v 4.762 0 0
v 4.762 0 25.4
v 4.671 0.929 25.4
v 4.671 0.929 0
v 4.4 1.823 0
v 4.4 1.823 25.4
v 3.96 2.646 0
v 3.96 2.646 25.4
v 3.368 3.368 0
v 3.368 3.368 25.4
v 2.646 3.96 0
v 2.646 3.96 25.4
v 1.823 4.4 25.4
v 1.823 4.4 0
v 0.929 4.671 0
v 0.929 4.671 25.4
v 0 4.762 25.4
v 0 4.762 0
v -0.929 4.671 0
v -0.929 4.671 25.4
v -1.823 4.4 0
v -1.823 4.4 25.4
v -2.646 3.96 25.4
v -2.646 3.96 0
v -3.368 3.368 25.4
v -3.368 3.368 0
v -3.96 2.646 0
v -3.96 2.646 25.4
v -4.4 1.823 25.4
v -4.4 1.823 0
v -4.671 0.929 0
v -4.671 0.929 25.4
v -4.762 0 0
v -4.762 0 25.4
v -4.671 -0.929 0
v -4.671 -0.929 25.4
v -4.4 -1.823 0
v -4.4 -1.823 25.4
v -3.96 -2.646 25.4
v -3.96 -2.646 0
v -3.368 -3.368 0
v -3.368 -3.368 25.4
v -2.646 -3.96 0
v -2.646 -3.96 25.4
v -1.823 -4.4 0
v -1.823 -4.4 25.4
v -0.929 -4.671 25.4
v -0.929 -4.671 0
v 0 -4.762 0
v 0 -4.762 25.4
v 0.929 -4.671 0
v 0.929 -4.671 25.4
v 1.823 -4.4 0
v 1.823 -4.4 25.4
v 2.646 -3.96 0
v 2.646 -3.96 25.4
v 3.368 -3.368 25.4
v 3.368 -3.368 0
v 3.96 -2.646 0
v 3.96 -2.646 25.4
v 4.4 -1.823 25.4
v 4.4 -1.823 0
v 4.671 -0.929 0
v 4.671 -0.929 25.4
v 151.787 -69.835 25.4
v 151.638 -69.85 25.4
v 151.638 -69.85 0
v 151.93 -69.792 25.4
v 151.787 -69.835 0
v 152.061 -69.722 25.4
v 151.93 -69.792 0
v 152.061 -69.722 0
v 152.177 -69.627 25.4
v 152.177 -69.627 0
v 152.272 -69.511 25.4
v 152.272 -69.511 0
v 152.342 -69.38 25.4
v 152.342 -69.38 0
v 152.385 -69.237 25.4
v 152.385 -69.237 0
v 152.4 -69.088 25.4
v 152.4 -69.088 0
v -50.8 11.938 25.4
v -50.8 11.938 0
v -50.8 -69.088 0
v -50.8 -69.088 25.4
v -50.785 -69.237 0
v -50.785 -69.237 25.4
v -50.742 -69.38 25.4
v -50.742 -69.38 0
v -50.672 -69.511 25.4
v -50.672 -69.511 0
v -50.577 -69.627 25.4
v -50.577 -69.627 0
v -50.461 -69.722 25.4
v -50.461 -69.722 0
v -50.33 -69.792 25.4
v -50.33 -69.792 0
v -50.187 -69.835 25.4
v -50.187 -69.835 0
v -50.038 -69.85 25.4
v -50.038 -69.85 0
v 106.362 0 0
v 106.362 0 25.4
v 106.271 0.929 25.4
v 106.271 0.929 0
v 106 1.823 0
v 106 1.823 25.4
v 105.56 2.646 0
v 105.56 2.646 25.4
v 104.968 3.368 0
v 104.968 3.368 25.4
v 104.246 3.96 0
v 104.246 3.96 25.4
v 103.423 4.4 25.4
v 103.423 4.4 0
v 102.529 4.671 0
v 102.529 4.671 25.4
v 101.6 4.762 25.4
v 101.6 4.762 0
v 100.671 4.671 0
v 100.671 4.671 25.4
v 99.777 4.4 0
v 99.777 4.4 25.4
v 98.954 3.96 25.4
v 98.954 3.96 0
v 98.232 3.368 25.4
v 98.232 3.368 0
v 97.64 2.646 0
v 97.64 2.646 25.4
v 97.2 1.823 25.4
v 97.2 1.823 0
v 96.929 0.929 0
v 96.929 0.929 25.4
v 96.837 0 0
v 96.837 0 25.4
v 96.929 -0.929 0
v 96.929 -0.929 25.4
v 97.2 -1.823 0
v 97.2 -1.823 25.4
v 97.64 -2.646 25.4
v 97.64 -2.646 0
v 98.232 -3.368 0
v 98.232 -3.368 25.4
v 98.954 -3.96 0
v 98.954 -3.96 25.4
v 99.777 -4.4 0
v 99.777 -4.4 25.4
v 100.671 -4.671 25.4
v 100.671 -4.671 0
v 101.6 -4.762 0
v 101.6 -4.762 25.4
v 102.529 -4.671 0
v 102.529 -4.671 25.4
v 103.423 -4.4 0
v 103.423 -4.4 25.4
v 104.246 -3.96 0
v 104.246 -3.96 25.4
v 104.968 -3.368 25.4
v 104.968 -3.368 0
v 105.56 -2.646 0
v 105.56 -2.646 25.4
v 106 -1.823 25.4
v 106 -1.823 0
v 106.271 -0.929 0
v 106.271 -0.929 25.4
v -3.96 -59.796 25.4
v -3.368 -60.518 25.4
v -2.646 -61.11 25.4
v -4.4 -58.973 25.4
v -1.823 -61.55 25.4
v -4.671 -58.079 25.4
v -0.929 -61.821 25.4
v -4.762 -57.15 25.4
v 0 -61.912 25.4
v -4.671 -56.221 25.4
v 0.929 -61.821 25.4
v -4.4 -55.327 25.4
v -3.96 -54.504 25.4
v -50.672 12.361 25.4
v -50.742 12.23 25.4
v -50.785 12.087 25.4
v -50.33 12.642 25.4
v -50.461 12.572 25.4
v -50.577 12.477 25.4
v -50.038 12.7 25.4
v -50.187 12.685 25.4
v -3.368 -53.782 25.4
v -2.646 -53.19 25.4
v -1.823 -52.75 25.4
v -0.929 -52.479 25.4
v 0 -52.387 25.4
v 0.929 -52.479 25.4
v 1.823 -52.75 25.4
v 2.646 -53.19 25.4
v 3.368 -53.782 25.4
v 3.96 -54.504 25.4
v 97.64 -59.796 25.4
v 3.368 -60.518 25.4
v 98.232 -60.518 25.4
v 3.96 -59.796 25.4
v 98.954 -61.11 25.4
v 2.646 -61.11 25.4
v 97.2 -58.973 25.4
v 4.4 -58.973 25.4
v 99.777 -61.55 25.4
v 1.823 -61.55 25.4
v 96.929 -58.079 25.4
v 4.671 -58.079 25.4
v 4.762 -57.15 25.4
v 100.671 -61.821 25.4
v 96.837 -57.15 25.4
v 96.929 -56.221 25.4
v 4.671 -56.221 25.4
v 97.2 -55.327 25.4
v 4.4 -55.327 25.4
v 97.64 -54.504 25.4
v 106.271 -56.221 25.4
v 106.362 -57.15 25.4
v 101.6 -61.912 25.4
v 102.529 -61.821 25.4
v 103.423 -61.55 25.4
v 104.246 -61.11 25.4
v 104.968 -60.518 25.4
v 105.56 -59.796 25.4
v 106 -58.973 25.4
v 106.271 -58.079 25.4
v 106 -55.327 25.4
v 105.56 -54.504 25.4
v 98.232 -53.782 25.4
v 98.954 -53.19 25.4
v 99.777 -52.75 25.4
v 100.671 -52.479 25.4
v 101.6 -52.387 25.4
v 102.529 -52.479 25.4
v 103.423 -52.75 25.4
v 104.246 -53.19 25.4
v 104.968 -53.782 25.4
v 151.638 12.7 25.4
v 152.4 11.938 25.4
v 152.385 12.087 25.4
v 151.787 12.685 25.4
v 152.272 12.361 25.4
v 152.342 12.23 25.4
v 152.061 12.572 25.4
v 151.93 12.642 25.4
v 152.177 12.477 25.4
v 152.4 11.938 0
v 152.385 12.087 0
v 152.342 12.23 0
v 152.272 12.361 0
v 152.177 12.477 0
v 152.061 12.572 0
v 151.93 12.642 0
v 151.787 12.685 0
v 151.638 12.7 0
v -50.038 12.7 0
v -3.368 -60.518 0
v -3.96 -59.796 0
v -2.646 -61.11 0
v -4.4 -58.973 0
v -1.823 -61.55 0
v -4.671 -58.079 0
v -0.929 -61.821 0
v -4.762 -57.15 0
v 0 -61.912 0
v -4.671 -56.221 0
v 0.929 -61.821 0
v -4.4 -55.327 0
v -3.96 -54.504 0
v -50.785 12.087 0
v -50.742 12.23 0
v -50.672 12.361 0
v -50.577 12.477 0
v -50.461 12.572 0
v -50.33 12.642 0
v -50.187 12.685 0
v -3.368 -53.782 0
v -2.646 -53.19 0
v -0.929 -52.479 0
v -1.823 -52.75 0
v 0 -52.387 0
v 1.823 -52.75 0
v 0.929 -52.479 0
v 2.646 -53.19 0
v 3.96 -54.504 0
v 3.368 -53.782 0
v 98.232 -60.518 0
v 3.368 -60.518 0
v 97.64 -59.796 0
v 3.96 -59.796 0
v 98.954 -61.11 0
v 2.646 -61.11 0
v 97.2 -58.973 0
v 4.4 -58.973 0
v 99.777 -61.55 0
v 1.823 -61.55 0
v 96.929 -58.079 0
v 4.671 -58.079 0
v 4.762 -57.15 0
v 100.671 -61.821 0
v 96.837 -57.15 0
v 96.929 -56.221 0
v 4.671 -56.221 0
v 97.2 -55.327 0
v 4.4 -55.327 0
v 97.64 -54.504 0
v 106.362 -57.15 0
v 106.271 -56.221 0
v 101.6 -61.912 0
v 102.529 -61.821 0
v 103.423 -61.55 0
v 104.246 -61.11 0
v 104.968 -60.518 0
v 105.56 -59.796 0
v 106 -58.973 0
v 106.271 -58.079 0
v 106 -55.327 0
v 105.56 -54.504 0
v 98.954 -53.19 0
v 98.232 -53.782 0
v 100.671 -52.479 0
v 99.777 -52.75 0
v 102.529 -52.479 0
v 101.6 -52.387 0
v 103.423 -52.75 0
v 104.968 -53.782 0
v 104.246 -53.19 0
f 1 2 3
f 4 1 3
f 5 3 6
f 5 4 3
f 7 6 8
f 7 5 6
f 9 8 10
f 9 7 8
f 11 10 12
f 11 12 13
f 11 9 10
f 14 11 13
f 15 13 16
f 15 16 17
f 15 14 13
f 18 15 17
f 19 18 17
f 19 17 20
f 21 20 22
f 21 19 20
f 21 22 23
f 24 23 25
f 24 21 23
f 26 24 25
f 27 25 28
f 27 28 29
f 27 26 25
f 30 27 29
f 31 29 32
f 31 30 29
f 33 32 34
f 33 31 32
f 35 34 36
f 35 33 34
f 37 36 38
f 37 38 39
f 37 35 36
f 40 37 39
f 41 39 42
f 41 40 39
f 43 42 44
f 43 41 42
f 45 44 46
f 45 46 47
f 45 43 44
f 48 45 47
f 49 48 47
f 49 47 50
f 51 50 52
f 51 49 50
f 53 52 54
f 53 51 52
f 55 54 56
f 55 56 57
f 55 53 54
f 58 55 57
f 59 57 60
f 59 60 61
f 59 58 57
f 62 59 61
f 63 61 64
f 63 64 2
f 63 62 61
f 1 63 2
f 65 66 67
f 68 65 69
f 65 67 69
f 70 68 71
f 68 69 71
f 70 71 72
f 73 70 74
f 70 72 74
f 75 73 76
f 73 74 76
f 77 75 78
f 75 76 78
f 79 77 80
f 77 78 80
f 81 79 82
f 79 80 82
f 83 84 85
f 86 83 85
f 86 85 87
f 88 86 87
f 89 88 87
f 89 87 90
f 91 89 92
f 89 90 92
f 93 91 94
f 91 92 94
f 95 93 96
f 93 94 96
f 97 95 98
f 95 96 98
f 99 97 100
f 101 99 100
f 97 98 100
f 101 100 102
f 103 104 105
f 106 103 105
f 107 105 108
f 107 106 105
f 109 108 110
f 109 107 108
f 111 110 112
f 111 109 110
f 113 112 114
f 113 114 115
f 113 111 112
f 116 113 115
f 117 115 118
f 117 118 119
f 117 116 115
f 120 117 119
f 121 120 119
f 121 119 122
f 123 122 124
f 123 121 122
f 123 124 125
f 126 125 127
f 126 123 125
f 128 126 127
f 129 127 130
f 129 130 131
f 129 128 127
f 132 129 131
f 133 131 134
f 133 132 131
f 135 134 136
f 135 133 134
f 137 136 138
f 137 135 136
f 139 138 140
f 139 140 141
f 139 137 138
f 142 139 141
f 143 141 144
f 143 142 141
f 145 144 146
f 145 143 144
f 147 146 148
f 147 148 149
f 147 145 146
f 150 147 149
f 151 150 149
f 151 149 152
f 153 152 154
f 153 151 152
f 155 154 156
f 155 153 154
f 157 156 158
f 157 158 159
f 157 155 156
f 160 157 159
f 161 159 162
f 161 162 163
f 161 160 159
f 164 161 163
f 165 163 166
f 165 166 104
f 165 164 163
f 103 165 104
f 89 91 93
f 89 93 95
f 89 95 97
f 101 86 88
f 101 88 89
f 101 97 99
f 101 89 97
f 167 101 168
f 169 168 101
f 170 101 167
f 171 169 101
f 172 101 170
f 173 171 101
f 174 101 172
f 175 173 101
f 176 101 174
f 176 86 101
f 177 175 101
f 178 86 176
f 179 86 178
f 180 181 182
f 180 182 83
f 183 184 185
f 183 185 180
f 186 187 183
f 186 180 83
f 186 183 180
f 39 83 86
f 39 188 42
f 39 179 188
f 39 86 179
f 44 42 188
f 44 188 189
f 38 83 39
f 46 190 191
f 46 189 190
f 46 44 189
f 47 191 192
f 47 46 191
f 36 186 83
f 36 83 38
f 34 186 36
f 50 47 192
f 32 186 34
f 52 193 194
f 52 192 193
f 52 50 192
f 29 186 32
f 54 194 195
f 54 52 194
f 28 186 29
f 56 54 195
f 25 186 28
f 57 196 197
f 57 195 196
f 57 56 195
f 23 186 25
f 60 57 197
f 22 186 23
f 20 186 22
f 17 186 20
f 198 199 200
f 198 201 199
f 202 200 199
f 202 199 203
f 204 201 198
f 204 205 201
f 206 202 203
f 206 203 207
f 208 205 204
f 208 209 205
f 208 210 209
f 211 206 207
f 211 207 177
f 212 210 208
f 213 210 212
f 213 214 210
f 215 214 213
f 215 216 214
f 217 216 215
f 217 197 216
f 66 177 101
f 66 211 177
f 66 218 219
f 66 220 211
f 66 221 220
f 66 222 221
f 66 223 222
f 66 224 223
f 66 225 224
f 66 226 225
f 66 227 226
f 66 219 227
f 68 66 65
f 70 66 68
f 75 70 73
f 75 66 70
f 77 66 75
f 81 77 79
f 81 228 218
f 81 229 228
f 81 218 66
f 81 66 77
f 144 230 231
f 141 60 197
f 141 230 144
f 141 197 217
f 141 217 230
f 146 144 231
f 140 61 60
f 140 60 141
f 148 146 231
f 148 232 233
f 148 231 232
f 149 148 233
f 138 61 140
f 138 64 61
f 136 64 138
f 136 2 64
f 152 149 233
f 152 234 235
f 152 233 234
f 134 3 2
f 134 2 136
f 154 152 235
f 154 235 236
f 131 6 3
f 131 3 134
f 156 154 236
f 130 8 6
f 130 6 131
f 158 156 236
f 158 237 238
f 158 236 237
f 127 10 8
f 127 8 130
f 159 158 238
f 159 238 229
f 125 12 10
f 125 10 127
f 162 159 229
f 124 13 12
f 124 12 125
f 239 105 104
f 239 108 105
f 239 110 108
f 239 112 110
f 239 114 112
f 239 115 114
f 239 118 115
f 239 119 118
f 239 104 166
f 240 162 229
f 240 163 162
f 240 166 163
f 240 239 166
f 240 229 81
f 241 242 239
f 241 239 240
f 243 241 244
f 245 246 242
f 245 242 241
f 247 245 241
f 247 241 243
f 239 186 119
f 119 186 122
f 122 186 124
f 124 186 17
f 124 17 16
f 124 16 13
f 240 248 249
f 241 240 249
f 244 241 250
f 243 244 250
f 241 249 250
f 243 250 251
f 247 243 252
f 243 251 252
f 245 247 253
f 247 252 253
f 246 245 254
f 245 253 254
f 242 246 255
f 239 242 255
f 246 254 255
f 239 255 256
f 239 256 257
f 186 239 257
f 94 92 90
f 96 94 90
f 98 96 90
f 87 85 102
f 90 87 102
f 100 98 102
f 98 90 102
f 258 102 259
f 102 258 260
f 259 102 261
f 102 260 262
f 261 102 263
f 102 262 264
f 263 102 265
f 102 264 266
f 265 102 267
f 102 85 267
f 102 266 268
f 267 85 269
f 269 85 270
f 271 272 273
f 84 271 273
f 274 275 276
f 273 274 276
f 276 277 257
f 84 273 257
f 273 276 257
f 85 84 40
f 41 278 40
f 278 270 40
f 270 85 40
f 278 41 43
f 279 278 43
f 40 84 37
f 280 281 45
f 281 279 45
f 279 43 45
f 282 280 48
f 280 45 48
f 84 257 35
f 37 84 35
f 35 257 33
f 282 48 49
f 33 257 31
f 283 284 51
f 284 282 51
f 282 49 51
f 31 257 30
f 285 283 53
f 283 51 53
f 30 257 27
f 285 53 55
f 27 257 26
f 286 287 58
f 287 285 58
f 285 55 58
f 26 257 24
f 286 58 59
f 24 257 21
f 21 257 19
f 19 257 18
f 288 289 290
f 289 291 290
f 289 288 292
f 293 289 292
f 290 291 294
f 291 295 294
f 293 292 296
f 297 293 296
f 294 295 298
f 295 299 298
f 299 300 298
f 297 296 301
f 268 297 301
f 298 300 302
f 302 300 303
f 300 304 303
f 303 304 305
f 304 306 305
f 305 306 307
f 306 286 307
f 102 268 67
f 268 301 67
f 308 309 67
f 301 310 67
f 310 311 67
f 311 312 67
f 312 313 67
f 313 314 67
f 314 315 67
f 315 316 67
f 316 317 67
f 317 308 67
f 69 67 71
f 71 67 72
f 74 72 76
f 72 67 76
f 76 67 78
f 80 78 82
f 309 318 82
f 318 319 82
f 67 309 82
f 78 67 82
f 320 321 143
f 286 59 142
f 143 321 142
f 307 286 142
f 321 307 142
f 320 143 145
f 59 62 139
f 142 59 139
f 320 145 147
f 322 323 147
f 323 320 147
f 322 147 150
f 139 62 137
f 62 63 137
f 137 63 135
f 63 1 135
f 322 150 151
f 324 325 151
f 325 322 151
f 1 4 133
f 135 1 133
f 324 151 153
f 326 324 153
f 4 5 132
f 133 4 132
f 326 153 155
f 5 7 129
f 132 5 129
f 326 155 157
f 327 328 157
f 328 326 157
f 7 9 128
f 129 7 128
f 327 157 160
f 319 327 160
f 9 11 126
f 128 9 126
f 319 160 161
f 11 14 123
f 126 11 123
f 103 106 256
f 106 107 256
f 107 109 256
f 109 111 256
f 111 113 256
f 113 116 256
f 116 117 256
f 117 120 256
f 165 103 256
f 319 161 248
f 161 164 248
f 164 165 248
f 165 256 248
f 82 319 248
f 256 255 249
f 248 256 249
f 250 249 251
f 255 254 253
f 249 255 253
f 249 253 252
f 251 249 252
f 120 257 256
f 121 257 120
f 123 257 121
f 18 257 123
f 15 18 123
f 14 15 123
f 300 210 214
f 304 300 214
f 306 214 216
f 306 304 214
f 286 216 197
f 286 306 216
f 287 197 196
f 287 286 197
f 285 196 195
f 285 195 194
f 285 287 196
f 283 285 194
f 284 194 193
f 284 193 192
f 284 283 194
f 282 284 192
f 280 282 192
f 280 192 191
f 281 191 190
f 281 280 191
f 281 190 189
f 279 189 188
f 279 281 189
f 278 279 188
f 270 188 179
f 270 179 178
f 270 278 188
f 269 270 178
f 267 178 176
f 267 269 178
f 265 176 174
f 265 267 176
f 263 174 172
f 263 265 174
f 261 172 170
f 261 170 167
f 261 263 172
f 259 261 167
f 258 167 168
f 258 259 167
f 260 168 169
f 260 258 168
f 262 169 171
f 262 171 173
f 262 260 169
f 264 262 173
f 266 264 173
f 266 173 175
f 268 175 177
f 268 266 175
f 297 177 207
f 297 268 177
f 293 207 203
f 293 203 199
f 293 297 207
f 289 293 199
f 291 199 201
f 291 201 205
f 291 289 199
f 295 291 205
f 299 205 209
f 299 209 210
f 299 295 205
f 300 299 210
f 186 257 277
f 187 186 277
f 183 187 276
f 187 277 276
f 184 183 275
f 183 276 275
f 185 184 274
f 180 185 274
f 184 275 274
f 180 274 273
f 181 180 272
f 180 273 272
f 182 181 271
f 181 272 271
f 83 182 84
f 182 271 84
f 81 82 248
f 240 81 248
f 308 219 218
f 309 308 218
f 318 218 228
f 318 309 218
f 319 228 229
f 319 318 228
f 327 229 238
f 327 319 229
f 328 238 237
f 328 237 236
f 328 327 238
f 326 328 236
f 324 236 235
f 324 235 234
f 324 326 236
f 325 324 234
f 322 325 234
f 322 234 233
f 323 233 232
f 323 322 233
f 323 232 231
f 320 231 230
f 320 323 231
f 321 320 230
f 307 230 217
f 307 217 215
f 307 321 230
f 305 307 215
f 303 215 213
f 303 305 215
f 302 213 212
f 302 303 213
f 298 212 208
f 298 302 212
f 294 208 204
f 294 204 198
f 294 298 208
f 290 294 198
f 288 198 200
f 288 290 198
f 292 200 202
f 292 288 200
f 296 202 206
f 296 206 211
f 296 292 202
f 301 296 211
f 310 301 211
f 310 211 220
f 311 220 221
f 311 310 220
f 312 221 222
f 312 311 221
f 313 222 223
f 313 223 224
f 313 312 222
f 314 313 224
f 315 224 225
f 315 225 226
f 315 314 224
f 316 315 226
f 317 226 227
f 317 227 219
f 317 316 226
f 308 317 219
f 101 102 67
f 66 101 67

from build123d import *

# Parameters (mm, degrees)
F0_R     = 4.7625
F1_DEPTH = 25.4


with BuildPart() as f1:
    # F0 (on Top) → F1 (new body)
    with BuildSketch(Plane.XY):
        with BuildLine():
            Line((151.638, 12.7), (-50.038, 12.7))
            ThreePointArc((-50.038, 12.7), (-50.576815, 12.476815), (-50.8, 11.938))
            Line((-50.8, 11.938), (-50.8, -69.088))
            ThreePointArc((-50.8, -69.088), (-50.576815, -69.626815), (-50.038, -69.85))
            Line((-50.038, -69.85), (151.638, -69.85))
            ThreePointArc((151.638, -69.85), (152.176815, -69.626815), (152.4, -69.088))
            Line((152.4, -69.088), (152.4, 11.938))
            ThreePointArc((152.4, 11.938), (152.176815, 12.476815), (151.638, 12.7))
        make_face()
        with Locations((0, -57.15)):
            Circle(F0_R, mode=Mode.SUBTRACT)
        with Locations((101.6, -57.15)):
            Circle(F0_R, mode=Mode.SUBTRACT)
        Circle(F0_R, mode=Mode.SUBTRACT)
        with Locations((101.6, 0)):
            Circle(F0_R, mode=Mode.SUBTRACT)
    extrude(amount=F1_DEPTH)


solid = f1.part
